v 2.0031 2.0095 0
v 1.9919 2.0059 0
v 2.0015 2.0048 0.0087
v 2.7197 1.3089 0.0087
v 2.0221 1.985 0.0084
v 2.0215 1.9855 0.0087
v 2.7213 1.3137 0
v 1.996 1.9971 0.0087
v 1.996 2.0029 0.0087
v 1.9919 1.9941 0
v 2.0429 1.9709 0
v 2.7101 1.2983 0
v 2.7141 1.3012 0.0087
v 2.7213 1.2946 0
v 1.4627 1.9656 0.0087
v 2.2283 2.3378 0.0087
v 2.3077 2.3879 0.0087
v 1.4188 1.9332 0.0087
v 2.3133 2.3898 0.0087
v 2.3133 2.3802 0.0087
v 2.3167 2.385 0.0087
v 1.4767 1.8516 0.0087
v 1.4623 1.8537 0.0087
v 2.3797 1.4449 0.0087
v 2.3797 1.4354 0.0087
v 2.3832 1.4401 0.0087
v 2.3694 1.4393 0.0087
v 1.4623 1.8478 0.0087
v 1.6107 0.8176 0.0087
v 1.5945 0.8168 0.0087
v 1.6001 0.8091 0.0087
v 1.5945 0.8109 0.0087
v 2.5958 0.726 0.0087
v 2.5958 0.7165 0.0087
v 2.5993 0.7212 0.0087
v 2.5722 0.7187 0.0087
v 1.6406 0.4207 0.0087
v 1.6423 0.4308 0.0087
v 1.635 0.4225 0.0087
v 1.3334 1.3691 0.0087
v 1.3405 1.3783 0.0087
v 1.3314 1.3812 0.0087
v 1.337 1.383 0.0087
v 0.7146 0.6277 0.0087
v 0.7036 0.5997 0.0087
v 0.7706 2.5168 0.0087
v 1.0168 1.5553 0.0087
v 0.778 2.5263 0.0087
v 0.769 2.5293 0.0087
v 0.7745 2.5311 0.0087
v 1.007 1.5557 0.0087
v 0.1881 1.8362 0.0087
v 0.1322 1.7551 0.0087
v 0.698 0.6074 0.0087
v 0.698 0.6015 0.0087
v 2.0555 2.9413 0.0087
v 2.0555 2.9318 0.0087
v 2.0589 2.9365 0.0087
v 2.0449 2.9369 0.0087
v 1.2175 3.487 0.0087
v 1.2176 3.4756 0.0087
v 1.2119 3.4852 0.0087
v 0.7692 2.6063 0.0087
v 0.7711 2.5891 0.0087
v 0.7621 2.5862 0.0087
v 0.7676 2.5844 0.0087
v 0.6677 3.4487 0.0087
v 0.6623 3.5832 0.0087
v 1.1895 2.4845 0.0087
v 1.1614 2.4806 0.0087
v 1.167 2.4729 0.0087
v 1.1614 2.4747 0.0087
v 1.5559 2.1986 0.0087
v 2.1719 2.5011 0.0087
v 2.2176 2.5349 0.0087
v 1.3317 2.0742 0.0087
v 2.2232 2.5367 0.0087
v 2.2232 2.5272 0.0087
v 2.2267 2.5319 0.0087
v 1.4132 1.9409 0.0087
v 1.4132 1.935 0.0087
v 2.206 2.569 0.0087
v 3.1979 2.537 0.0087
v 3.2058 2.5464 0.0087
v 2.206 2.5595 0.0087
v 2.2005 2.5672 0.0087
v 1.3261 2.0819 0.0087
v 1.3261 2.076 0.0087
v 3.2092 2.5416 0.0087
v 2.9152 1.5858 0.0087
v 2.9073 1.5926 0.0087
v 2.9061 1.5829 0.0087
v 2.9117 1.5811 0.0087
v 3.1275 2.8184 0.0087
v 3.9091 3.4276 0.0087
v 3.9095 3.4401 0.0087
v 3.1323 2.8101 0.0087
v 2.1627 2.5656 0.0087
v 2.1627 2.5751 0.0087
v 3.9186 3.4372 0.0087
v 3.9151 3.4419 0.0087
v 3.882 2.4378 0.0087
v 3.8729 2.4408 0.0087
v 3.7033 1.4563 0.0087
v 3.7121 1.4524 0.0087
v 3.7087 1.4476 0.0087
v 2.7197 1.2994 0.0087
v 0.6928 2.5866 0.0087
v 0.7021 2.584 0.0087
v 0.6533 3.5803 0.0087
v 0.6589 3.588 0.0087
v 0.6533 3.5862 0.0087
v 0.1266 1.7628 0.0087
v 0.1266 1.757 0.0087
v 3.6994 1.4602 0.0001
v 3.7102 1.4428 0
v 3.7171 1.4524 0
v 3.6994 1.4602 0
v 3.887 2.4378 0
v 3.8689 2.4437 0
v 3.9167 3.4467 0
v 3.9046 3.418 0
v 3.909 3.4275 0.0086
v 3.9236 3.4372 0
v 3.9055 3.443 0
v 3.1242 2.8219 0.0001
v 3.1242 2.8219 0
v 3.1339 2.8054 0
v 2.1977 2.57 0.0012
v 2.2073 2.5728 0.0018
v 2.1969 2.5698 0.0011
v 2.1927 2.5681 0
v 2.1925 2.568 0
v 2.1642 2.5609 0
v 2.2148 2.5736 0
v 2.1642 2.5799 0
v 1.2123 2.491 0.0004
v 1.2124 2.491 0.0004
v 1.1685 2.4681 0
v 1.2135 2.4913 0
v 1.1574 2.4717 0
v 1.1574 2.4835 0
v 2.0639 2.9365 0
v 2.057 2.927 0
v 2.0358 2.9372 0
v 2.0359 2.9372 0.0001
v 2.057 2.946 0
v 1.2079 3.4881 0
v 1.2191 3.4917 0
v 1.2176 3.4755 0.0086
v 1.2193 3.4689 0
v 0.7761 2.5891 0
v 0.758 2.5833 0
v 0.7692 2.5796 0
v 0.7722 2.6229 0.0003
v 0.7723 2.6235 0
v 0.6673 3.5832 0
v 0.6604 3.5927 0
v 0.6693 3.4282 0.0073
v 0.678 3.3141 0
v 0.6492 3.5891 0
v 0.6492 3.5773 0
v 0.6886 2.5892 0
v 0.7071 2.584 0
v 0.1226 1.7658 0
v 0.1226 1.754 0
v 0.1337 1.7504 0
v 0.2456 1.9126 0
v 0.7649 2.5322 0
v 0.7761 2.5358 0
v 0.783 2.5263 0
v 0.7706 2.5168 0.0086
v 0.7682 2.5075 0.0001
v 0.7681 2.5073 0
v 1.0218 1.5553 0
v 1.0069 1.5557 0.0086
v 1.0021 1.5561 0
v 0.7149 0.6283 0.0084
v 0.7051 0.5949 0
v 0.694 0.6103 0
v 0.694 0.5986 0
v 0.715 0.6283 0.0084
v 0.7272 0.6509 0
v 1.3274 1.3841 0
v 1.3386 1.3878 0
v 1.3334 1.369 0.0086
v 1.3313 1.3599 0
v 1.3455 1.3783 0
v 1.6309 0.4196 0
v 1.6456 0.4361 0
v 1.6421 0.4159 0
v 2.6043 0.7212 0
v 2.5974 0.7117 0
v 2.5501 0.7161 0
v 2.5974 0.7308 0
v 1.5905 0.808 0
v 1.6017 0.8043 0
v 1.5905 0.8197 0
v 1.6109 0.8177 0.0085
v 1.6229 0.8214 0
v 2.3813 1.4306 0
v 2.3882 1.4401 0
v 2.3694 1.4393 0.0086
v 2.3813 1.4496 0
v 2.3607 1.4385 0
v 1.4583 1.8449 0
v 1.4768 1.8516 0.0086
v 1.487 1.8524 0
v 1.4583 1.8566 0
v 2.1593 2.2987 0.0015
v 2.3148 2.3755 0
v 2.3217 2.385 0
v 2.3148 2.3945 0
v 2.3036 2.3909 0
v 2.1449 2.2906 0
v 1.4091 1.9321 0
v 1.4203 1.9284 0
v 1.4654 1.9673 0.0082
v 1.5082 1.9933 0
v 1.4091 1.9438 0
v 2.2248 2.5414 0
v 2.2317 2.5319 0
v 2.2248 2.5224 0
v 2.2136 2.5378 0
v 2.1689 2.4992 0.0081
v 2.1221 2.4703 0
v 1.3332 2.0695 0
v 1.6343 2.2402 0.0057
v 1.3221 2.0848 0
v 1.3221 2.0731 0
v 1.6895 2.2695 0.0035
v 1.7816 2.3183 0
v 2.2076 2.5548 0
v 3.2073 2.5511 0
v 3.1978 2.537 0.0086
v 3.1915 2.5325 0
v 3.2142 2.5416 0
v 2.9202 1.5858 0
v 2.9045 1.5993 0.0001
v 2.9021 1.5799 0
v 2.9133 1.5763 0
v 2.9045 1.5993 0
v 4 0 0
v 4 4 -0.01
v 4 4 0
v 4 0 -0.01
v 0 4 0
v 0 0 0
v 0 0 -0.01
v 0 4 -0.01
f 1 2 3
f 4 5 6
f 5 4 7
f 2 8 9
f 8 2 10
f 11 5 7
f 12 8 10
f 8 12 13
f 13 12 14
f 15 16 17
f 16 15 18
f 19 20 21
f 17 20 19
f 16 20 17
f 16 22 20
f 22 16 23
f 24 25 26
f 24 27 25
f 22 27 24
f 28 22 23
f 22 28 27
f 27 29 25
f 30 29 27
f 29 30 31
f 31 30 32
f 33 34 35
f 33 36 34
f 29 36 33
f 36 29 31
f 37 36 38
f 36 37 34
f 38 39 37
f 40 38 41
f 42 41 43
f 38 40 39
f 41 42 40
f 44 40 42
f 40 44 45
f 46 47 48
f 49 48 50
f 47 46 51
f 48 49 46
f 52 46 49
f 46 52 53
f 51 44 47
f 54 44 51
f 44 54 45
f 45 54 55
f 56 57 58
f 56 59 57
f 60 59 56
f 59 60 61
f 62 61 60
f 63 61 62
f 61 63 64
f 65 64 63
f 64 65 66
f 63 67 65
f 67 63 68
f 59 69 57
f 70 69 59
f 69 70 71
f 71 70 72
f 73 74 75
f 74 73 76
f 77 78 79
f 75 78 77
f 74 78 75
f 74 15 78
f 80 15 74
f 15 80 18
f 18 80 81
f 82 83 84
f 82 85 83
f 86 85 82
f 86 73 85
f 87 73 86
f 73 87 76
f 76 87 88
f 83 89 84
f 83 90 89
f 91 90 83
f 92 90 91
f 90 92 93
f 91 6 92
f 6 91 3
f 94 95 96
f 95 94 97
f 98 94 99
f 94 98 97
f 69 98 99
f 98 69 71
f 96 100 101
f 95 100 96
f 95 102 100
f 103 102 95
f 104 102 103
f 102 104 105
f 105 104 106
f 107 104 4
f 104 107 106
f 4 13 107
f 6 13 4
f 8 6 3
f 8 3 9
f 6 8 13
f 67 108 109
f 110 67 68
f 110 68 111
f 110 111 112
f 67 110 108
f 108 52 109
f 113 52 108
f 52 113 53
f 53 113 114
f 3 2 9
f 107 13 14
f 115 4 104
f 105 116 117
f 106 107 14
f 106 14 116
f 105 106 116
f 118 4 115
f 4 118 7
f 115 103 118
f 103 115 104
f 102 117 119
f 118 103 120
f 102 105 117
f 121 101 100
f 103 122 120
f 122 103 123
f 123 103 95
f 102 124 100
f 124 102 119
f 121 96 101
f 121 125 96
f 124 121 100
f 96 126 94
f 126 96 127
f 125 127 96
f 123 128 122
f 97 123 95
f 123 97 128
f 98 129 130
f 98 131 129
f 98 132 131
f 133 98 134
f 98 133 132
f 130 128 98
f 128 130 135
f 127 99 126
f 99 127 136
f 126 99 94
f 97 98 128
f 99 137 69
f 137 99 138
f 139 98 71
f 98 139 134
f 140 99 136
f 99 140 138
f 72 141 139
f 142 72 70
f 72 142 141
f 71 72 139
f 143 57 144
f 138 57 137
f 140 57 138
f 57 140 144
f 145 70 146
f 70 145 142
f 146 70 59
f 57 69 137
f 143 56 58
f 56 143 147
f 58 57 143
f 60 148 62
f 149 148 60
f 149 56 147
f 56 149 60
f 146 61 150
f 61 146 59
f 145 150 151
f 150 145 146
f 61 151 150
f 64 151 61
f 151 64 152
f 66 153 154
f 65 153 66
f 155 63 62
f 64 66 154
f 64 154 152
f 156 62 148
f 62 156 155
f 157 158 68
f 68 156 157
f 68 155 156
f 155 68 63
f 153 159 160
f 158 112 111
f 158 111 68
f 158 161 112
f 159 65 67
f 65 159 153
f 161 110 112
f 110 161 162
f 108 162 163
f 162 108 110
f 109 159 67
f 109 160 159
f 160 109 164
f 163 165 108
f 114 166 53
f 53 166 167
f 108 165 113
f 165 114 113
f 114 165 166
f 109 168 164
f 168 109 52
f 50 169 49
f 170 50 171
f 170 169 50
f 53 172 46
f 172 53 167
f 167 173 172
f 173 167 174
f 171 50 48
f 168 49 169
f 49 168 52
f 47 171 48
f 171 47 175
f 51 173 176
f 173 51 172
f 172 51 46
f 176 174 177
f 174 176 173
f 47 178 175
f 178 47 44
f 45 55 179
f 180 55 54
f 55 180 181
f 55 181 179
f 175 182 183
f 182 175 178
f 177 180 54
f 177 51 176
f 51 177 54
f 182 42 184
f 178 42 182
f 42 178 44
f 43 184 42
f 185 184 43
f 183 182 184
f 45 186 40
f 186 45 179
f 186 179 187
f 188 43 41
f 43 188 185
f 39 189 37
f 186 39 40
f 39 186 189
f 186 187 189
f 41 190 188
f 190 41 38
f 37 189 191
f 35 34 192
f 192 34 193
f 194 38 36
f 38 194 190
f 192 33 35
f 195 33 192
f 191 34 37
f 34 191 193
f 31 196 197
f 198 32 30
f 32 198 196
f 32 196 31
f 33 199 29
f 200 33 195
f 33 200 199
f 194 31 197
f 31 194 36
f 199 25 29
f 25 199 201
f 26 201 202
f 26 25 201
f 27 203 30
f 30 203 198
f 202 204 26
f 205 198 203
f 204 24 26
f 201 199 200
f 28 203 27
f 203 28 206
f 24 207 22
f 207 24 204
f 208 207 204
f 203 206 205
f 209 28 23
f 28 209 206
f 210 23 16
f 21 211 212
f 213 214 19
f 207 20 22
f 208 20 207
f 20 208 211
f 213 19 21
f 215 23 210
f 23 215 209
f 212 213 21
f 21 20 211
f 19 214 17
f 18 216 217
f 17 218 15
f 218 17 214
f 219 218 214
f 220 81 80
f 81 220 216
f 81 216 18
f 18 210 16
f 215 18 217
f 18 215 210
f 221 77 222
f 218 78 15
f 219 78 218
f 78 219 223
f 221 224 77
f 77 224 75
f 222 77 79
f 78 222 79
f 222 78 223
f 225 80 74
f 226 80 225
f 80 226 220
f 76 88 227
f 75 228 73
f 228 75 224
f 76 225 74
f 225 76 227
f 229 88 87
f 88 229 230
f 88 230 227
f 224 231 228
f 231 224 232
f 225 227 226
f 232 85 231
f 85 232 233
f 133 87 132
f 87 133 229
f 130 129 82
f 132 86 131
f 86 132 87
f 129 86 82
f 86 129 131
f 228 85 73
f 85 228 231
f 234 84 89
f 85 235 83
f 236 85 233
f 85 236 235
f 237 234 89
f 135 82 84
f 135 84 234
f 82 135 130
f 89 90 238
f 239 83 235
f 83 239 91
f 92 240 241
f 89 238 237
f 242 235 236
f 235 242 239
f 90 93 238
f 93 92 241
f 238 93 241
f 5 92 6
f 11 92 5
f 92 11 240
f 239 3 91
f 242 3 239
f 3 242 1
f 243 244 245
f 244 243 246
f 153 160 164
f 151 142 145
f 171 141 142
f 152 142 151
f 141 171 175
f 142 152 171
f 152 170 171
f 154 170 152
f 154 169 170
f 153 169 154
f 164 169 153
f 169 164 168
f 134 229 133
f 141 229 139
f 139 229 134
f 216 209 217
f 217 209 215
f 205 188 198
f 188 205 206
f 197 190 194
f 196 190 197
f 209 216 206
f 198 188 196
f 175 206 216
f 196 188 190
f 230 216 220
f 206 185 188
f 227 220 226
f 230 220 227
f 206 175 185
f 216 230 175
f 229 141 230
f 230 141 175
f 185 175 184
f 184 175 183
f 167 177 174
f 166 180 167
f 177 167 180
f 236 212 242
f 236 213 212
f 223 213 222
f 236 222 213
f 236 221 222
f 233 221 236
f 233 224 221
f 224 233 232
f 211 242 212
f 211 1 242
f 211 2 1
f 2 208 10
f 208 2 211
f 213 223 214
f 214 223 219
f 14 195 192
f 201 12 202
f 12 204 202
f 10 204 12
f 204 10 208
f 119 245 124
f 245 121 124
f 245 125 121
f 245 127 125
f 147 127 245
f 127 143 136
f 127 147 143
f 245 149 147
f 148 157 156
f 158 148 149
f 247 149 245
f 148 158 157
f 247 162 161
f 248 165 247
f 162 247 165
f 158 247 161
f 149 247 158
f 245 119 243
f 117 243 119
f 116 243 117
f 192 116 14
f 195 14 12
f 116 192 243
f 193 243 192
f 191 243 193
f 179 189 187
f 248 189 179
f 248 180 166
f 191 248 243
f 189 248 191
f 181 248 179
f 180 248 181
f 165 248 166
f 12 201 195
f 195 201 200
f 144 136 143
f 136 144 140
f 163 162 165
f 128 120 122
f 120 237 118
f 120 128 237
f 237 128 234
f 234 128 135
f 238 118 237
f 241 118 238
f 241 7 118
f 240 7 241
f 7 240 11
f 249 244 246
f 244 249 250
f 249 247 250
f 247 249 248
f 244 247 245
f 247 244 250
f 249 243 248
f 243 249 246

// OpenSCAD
hull(){
    translate([2.0, 2.0]) sphere(0.01);
    translate([2.71818335, 1.30414608]) sphere(0.01);
}
hull(){
    translate([2.71818335, 1.30414608]) sphere(0.01);
    translate([3.70713872, 1.45235971]) sphere(0.01);
}
hull(){
    translate([3.70713872, 1.45235971]) sphere(0.01);
    translate([3.87696192, 2.43783425]) sphere(0.01);
}
hull(){
    translate([3.87696192, 2.43783425]) sphere(0.01);
    translate([3.91357537, 3.43716376]) sphere(0.01);
}
hull(){
    translate([3.91357537, 3.43716376]) sphere(0.01);
    translate([3.13079434, 2.81486651]) sphere(0.01);
}
hull(){
    translate([3.13079434, 2.81486651]) sphere(0.01);
    translate([2.16114344, 2.57037289]) sphere(0.01);
}
hull(){
    translate([2.16114344, 2.57037289]) sphere(0.01);
    translate([1.16545378, 2.47762534]) sphere(0.01);
}
hull(){
    translate([1.16545378, 2.47762534]) sphere(0.01);
    translate([2.05394712, 2.93651487]) sphere(0.01);
}
hull(){
    translate([2.05394712, 2.93651487]) sphere(0.01);
    translate([1.21598102, 3.48223716]) sphere(0.01);
}
hull(){
    translate([1.21598102, 3.48223716]) sphere(0.01);
    translate([0.76610071, 2.5891483]) sphere(0.01);
}
hull(){
    translate([0.76610071, 2.5891483]) sphere(0.01);
    translate([0.65732261, 3.58321436]) sphere(0.01);
}
hull(){
    translate([0.65732261, 3.58321436]) sphere(0.01);
    translate([0.69709853, 2.58400573]) sphere(0.01);
}
hull(){
    translate([0.69709853, 2.58400573]) sphere(0.01);
    translate([0.13065988, 1.75990183]) sphere(0.01);
}
hull(){
    translate([0.13065988, 1.75990183]) sphere(0.01);
    translate([0.77299698, 2.52632406]) sphere(0.01);
}
hull(){
    translate([0.77299698, 2.52632406]) sphere(0.01);
    translate([1.0118222, 1.55526149]) sphere(0.01);
}
hull(){
    translate([1.0118222, 1.55526149]) sphere(0.01);
    translate([0.70205327, 0.60444963]) sphere(0.01);
}
hull(){
    translate([0.70205327, 0.60444963]) sphere(0.01);
    translate([1.335465, 1.37826457]) sphere(0.01);
}
hull(){
    translate([1.335465, 1.37826457]) sphere(0.01);
    translate([1.6390153, 0.42544916]) sphere(0.01);
}
hull(){
    translate([1.6390153, 0.42544916]) sphere(0.01);
    translate([2.59426596, 0.72124669]) sphere(0.01);
}
hull(){
    translate([2.59426596, 0.72124669]) sphere(0.01);
    translate([1.5985624, 0.81384494]) sphere(0.01);
}
hull(){
    translate([1.5985624, 0.81384494]) sphere(0.01);
    translate([2.37817514, 1.44010686]) sphere(0.01);
}
hull(){
    translate([2.37817514, 1.44010686]) sphere(0.01);
    translate([1.46638423, 1.85076164]) sphere(0.01);
}
hull(){
    translate([1.46638423, 1.85076164]) sphere(0.01);
    translate([2.31171431, 2.38500602]) sphere(0.01);
}
hull(){
    translate([2.31171431, 2.38500602]) sphere(0.01);
    translate([1.4172158, 1.9379351]) sphere(0.01);
}
hull(){
    translate([1.4172158, 1.9379351]) sphere(0.01);
    translate([2.22168971, 2.53192309]) sphere(0.01);
}
hull(){
    translate([2.22168971, 2.53192309]) sphere(0.01);
    translate([1.33015713, 2.07896651]) sphere(0.01);
}
hull(){
    translate([1.33015713, 2.07896651]) sphere(0.01);
    translate([2.20450076, 2.56427385]) sphere(0.01);
}
hull(){
    translate([2.20450076, 2.56427385]) sphere(0.01);
    translate([3.20424387, 2.54160877]) sphere(0.01);
}
hull(){
    translate([3.20424387, 2.54160877]) sphere(0.01);
    translate([2.91019435, 1.58581858]) sphere(0.01);
}
hull(){
    translate([2.91019435, 1.58581858]) sphere(0.01);
    translate([2.0, 2.0]) sphere(0.01);
}
translate([0,0,-0.01]) color([0.1,0.1,0.1]) cube([4,4,0.01]);
